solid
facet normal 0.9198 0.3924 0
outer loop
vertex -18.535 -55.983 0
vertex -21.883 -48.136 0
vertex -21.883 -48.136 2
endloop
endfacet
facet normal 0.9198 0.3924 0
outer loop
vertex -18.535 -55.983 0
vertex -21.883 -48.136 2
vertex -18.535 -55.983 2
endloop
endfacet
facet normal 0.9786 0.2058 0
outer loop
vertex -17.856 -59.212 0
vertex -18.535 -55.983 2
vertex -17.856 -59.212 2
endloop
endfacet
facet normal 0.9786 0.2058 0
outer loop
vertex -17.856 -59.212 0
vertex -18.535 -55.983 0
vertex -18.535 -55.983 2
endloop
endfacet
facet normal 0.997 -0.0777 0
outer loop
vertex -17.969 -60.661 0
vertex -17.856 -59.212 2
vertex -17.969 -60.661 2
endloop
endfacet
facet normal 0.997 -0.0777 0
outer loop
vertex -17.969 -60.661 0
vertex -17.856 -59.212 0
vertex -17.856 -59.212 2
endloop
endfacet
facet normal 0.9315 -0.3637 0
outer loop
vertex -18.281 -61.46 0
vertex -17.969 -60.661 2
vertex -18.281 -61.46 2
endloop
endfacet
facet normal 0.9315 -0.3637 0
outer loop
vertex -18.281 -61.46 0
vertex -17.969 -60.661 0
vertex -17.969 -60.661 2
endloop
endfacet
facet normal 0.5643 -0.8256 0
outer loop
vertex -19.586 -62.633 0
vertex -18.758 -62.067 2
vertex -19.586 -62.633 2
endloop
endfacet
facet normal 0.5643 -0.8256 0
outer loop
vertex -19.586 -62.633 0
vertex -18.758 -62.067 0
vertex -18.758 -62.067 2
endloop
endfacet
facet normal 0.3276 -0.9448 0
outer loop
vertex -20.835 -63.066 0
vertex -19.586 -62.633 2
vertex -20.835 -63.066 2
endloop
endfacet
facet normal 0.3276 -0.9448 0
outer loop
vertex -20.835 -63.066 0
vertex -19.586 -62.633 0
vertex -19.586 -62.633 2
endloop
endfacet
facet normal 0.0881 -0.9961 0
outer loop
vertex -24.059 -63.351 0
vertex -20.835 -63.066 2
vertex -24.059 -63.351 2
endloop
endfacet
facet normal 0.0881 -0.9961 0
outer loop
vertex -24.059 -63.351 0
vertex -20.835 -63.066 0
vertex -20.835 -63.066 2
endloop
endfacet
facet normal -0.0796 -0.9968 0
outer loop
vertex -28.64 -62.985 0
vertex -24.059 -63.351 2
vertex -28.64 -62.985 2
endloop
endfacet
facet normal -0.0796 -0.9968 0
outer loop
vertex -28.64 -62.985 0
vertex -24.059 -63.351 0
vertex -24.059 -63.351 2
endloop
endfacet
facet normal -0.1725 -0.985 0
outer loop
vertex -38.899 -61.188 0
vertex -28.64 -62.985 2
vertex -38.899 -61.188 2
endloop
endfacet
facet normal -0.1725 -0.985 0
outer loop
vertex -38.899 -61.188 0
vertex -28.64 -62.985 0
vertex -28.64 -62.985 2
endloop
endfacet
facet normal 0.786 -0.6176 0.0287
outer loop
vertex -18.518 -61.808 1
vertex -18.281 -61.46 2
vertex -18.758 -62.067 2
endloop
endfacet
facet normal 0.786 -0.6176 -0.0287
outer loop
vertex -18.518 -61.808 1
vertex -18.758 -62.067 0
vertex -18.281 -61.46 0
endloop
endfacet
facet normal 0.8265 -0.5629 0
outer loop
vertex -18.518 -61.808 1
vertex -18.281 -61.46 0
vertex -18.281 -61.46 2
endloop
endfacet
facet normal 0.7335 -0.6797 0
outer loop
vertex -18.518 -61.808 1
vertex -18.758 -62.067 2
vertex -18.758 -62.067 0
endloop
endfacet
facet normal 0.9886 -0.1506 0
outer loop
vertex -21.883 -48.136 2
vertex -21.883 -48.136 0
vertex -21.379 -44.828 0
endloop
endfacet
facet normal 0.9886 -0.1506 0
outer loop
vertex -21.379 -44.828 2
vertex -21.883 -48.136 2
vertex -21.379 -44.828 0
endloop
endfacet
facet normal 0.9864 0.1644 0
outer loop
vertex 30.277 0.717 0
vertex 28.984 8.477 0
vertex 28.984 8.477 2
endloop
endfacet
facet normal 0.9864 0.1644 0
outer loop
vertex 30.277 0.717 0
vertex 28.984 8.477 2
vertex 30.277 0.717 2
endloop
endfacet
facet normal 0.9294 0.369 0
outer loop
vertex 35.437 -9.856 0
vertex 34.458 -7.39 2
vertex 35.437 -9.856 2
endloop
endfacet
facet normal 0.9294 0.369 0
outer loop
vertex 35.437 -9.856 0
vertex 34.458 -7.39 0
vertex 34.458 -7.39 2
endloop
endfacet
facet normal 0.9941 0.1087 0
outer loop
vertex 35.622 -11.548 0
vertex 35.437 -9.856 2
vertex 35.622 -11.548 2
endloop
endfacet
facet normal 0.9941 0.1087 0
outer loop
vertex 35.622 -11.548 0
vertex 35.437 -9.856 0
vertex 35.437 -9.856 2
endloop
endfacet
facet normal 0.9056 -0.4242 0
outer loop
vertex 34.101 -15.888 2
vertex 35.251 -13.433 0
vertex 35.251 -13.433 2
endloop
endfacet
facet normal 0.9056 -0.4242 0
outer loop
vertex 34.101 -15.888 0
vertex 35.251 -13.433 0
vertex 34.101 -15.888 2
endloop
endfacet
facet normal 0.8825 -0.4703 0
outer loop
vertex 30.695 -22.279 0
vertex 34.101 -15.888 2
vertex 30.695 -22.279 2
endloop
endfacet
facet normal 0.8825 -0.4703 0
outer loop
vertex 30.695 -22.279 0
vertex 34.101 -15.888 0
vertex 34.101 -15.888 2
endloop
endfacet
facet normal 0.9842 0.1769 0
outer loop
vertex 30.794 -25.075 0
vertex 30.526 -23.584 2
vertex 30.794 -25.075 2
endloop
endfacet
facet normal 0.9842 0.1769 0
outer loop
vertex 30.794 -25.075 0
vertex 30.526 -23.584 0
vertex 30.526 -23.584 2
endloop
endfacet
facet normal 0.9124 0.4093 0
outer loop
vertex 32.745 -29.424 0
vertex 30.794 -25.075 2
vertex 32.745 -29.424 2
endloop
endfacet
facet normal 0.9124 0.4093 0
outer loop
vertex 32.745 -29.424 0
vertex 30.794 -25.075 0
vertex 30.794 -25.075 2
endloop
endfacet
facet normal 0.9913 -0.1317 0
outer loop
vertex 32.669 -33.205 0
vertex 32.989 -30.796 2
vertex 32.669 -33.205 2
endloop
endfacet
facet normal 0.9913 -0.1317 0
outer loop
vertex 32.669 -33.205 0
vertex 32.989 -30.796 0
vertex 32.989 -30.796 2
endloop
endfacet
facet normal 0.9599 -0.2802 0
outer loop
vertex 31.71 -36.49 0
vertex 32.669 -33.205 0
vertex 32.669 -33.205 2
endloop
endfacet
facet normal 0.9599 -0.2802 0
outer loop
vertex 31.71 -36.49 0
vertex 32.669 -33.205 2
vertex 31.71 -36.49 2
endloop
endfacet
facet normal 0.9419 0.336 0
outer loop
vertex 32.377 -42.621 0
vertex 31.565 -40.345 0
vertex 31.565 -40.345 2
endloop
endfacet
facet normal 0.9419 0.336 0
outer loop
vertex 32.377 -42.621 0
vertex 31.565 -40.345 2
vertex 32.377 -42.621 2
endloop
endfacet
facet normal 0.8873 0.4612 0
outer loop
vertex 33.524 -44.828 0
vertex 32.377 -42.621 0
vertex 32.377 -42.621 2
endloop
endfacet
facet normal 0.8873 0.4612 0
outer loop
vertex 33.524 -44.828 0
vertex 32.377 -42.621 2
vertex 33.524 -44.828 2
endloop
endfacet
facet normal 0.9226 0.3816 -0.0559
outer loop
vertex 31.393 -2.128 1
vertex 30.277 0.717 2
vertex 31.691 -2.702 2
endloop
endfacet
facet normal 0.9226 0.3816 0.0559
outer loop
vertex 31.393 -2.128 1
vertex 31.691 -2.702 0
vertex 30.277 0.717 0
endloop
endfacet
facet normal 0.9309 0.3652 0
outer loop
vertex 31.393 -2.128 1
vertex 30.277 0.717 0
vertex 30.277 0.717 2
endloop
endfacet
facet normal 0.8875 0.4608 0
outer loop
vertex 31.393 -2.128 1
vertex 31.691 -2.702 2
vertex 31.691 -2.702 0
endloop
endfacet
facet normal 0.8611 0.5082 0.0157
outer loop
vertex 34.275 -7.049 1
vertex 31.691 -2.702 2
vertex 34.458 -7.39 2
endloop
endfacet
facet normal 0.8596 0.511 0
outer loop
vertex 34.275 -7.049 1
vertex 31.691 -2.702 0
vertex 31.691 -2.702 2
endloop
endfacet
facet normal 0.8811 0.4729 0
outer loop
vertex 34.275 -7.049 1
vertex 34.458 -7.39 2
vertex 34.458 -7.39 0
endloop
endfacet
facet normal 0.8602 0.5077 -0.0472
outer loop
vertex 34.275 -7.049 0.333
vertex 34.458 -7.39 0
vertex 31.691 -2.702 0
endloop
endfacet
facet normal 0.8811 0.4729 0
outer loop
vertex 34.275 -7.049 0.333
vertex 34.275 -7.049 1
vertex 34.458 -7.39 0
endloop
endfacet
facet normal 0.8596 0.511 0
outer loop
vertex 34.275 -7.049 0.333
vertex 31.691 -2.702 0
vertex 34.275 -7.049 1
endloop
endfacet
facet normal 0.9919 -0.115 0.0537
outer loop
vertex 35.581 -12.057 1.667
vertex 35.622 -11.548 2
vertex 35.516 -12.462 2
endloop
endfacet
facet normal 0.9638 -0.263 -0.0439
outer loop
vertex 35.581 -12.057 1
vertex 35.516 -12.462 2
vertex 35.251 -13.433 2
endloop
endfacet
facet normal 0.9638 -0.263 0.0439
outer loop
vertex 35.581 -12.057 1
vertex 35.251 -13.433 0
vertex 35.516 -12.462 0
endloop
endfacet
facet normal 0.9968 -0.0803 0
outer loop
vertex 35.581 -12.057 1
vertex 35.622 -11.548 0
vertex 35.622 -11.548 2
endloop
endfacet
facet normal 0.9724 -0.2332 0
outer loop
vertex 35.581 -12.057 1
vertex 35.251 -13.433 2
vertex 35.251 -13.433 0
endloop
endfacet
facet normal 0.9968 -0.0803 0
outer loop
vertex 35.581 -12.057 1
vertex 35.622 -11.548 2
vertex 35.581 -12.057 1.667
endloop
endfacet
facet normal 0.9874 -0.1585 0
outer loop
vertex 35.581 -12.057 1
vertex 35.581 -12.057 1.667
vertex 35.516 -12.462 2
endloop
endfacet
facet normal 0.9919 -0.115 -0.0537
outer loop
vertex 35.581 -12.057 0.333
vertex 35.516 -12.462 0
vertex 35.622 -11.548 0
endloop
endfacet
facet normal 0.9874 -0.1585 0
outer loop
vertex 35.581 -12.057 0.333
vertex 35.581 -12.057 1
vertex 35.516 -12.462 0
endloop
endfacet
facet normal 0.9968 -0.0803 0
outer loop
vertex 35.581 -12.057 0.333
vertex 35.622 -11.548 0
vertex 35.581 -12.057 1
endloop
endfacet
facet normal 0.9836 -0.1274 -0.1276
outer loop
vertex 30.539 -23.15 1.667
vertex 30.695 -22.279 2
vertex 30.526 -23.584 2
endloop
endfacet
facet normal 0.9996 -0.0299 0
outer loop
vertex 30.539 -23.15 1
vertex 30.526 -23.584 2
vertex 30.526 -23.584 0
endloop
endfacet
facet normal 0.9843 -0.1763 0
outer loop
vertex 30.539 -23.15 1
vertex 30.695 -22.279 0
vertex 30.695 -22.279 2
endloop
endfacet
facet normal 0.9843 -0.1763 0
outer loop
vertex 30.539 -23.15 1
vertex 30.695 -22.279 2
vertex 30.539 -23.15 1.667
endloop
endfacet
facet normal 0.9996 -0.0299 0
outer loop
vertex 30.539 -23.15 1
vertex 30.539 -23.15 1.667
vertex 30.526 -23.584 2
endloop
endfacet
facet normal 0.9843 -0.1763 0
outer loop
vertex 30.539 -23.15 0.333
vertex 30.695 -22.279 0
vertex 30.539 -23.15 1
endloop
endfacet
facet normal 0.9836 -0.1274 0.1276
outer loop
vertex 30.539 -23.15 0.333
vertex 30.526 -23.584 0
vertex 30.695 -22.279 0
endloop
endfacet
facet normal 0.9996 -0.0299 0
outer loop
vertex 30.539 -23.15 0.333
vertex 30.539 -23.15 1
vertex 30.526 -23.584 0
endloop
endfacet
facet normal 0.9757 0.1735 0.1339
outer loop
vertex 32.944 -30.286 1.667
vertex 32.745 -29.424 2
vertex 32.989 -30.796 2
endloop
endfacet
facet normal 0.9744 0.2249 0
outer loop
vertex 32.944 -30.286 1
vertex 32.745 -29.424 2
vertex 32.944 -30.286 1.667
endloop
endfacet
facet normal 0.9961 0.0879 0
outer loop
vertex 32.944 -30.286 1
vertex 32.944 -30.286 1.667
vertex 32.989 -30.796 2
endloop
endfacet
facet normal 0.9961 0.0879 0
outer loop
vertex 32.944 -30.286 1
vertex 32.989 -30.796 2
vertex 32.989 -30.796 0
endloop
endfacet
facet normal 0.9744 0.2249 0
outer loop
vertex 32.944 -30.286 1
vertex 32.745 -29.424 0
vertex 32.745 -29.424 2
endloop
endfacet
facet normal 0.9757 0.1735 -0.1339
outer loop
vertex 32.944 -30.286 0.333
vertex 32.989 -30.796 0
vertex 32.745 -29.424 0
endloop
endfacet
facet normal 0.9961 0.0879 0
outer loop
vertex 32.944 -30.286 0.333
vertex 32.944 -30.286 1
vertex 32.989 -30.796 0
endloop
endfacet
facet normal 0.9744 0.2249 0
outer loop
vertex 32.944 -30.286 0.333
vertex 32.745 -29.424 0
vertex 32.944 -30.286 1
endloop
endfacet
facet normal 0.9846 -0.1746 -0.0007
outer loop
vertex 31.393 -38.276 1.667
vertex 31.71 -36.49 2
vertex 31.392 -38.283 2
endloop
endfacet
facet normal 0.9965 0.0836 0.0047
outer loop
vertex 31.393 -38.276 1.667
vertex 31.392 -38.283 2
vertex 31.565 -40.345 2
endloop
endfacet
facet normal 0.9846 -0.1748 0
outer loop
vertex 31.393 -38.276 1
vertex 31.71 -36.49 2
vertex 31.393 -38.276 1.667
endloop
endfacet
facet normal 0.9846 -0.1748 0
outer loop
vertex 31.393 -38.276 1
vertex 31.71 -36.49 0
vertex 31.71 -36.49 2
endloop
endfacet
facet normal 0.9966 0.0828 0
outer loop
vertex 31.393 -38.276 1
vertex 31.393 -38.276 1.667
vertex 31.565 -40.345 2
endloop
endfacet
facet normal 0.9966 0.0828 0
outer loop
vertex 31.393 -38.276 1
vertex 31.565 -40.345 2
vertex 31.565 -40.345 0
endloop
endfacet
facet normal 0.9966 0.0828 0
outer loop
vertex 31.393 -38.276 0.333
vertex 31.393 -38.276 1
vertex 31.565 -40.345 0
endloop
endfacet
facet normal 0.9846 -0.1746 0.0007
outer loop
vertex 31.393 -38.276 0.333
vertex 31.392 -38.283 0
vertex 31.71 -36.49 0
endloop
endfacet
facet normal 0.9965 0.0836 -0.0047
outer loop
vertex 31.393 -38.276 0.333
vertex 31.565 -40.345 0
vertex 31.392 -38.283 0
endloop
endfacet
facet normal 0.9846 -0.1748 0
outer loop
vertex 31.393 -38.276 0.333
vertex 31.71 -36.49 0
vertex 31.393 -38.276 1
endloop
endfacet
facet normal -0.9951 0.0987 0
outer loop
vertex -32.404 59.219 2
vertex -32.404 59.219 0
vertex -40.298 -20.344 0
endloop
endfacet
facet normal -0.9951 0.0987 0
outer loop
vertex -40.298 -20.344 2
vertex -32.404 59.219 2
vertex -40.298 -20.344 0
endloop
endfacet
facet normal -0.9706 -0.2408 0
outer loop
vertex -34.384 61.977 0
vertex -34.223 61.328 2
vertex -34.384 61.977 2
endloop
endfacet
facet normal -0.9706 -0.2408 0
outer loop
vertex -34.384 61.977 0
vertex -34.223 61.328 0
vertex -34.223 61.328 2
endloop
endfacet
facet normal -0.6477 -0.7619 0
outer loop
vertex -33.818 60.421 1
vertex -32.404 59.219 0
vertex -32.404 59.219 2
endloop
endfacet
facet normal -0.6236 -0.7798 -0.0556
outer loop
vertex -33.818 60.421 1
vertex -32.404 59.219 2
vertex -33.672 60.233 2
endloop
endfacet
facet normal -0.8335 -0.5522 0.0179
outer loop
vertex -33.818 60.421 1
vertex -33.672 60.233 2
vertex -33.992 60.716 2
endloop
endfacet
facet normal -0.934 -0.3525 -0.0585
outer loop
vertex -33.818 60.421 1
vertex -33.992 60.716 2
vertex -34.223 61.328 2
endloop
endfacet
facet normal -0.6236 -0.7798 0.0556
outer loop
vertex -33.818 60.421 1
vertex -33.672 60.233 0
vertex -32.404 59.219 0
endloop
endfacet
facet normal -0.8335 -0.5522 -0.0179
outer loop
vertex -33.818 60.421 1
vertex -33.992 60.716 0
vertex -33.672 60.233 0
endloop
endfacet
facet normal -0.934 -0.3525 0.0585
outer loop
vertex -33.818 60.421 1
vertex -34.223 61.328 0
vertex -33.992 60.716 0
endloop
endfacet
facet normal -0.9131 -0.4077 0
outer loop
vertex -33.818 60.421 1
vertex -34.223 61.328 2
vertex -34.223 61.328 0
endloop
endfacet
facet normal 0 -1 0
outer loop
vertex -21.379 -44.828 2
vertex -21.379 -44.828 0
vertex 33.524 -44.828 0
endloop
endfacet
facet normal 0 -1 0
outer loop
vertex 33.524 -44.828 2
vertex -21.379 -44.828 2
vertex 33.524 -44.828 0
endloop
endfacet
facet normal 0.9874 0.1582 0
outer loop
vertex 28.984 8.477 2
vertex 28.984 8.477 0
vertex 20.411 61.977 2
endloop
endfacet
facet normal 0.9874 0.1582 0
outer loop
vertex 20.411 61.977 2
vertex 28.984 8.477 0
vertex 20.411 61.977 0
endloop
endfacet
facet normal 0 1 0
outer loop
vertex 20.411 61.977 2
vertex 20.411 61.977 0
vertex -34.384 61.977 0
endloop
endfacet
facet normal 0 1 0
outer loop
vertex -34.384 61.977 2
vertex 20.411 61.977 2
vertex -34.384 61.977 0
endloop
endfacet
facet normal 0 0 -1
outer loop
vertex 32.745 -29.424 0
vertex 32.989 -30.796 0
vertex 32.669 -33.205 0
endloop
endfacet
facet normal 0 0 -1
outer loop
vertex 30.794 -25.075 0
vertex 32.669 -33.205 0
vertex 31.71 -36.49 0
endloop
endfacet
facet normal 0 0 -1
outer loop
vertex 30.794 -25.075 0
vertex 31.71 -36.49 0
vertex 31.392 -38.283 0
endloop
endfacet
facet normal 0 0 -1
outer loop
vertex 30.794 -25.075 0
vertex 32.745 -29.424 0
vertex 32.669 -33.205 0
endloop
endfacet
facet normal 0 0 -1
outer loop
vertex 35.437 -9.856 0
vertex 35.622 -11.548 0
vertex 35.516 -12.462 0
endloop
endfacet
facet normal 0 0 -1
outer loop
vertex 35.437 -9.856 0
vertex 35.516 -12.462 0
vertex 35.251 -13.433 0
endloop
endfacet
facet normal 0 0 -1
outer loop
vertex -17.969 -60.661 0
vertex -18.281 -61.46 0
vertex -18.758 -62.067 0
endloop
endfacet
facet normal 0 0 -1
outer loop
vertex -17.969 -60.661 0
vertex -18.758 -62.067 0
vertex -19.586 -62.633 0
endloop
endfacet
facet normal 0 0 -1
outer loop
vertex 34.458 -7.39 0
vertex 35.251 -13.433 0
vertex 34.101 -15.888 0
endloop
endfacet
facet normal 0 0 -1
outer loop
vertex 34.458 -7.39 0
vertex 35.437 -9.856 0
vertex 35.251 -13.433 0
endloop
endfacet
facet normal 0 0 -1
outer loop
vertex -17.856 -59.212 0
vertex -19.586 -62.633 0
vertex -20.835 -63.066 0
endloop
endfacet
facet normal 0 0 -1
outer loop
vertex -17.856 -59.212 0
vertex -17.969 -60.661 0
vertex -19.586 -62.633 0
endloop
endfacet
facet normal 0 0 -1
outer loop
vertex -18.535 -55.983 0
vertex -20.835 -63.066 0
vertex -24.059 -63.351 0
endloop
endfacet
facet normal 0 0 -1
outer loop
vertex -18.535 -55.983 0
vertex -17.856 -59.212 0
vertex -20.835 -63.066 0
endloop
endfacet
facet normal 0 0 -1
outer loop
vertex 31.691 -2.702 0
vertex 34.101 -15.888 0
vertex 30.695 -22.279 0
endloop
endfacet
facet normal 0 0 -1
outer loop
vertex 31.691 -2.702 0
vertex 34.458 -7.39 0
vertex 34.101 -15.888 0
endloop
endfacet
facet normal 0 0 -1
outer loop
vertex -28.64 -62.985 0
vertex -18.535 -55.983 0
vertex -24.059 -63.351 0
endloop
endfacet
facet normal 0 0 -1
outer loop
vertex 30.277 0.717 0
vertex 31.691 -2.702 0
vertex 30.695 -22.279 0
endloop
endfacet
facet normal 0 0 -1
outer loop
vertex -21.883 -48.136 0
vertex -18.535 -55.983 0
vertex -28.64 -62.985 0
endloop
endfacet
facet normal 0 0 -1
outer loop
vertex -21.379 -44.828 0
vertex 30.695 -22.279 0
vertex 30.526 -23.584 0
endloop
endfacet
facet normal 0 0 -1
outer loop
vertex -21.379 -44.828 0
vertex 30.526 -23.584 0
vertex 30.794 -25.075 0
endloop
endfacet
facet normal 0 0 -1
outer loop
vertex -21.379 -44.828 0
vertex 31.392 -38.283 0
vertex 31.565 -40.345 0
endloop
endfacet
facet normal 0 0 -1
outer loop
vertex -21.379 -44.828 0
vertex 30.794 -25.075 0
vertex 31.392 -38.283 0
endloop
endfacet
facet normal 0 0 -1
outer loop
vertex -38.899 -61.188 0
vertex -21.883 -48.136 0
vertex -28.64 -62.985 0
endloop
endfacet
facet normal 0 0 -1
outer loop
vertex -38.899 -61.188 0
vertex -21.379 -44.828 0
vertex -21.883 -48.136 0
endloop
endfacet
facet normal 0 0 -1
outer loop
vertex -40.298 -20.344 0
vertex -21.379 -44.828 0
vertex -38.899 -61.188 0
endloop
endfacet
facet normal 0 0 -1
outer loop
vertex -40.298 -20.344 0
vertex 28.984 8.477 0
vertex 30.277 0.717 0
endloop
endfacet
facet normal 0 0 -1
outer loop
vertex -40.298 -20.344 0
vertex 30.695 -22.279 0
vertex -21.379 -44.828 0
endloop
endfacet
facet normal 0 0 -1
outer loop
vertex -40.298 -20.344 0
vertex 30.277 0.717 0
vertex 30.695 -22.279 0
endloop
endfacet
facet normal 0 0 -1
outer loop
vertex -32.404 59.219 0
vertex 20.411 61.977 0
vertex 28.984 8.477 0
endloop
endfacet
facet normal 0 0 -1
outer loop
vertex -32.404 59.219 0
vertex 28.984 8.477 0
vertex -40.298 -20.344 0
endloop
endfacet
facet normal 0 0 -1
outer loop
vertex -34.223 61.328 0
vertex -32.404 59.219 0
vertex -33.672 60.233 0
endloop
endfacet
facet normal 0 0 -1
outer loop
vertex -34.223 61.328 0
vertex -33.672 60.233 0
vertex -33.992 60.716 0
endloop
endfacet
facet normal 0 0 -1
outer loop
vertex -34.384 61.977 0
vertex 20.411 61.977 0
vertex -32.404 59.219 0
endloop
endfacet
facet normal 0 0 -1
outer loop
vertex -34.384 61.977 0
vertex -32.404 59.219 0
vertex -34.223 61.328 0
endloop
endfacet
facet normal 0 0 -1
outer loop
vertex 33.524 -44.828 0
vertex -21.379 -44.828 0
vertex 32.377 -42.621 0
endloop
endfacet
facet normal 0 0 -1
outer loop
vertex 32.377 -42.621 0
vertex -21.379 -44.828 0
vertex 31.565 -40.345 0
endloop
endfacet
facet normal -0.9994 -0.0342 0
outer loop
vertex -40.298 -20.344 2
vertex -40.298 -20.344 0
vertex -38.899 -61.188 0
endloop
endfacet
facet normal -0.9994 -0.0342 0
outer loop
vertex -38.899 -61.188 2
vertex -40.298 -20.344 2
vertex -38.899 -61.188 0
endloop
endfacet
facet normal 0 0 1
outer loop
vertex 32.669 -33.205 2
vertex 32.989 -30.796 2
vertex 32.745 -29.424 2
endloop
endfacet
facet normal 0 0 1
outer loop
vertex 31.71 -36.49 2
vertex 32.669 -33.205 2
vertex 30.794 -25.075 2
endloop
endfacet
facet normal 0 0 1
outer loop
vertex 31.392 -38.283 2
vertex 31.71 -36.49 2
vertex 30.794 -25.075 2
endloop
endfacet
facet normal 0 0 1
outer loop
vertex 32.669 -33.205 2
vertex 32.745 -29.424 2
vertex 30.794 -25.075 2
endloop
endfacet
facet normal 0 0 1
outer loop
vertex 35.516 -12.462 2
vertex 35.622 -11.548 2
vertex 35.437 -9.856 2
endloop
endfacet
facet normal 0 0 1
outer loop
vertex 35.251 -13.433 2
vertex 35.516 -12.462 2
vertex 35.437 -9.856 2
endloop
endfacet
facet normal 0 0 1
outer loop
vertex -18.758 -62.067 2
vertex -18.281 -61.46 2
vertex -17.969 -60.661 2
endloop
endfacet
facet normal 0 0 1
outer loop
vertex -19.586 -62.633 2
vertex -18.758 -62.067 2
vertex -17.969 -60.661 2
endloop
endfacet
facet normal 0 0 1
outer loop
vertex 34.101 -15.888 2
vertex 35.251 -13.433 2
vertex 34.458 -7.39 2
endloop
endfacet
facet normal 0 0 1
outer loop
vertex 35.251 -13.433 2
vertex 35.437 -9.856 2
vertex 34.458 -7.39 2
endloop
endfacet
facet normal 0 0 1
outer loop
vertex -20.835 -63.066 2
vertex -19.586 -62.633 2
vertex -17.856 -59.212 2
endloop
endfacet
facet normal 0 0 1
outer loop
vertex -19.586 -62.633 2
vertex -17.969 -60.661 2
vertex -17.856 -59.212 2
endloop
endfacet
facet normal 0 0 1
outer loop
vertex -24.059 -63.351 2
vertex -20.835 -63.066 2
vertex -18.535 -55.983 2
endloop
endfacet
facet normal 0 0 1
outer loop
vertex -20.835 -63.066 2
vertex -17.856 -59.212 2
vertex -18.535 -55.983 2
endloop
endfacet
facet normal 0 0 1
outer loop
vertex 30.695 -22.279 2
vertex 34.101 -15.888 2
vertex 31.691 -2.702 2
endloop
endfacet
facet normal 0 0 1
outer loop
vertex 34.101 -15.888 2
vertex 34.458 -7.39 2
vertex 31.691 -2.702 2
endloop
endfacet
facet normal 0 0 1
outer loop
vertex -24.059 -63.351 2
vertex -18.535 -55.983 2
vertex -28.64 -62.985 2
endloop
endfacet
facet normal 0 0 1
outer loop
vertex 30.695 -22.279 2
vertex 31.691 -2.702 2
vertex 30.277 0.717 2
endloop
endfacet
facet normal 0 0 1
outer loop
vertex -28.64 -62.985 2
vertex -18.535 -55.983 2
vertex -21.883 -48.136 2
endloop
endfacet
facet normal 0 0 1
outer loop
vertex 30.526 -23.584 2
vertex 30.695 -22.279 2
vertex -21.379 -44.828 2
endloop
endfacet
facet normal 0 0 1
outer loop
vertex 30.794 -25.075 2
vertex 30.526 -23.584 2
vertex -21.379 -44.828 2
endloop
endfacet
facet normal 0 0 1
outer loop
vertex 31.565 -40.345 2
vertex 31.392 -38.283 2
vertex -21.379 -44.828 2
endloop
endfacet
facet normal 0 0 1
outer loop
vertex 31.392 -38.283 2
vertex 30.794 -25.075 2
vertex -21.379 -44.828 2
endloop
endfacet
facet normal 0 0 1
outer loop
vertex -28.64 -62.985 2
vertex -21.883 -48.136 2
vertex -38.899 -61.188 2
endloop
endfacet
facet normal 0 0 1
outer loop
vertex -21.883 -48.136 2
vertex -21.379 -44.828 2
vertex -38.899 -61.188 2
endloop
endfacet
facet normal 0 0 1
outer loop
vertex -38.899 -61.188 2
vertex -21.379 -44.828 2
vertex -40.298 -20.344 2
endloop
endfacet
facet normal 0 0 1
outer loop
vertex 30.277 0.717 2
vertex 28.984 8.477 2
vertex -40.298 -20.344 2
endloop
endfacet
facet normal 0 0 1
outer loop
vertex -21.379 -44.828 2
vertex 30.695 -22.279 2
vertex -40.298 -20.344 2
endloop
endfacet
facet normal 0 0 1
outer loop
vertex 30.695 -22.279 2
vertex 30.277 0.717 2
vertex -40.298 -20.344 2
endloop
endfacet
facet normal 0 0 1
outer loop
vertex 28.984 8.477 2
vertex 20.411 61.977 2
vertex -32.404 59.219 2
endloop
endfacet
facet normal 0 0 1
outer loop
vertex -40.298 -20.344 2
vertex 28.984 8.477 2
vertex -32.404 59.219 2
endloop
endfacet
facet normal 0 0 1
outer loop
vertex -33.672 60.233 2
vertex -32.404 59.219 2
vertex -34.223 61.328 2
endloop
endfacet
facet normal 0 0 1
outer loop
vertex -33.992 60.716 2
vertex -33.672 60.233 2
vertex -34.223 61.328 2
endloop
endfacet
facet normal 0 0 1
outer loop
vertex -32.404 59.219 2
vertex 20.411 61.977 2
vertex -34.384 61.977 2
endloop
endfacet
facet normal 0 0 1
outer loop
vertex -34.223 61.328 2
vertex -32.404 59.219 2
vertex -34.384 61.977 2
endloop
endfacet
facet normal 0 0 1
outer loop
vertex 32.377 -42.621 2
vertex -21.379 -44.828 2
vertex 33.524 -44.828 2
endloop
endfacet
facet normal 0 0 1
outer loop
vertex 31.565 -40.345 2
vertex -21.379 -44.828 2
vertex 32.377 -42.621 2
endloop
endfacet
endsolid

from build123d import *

# Parameters (mm, degrees)
F1_DEPTH = 2


# Not quite as in the source:
# - a feature of the source that left no trace in its solid (it failed there, or was rolled back) is left out


with BuildPart() as f1:
    # F0 (on Top) → F1 (new body)
    with BuildSketch(Plane.XY):
        with BuildLine():
            add(Edge.make_bspline(
                [(-32.4043067872, 59.2193437133), (-32.9455181975, 59.581828676), (-33.9978316805, 60.2866323929), (-34.2577204684, 61.4241960814), (-34.3839468261, 61.9767036454)],
                knots=[0, 0, 0, 0, 0.5143062586, 1, 1, 1, 1], degree=3))
            Line((-32.4043067872, 59.2193437133), (-40.29759312, -20.3441163994))
            Line((-40.29759312, -20.3441163994), (-38.8994998628, -61.1876496762))
            add(Edge.make_bspline(
                [(-21.8826408634, -48.1355482657), (-19.2255669001, -53.7660393666), (-13.3709239797, -66.1723612522), (-29.8818826365, -62.948430269), (-38.8994998628, -61.1876496762)],
                knots=[0, 0, 0, 0, 0.4538404817, 1, 1, 1, 1], degree=3))
            Line((-21.8826408634, -48.1355482657), (-21.3790618005, -44.8284622711))
            Line((-21.3790618005, -44.8284622711), (33.52433514, -44.8284622711))
            add(Edge.make_bspline(
                [(28.984086711, 8.4774404124), (29.3516469163, 4.8591304728), (30.0850907545, -2.3609850111), (39.1649832019, -11.8903794357), (27.4292491551, -23.0695594567), (34.9658128507, -30.0388830909), (29.9798094231, -38.3642272099), (32.3760551751, -42.734317045), (33.52433514, -44.8284622711)],
                knots=[0, 0, 0, 0, 0.1802729556, 0.3597236224, 0.5505400077, 0.7005520483, 0.8565046665, 1, 1, 1, 1], degree=3))
            Line((28.984086711, 8.4774404124), (20.4112881077, 61.9767036454))
            Line((20.4112881077, 61.9767036454), (-34.3839468261, 61.9767036454))
        make_face()
    extrude(amount=F1_DEPTH)


solid = f1.part
